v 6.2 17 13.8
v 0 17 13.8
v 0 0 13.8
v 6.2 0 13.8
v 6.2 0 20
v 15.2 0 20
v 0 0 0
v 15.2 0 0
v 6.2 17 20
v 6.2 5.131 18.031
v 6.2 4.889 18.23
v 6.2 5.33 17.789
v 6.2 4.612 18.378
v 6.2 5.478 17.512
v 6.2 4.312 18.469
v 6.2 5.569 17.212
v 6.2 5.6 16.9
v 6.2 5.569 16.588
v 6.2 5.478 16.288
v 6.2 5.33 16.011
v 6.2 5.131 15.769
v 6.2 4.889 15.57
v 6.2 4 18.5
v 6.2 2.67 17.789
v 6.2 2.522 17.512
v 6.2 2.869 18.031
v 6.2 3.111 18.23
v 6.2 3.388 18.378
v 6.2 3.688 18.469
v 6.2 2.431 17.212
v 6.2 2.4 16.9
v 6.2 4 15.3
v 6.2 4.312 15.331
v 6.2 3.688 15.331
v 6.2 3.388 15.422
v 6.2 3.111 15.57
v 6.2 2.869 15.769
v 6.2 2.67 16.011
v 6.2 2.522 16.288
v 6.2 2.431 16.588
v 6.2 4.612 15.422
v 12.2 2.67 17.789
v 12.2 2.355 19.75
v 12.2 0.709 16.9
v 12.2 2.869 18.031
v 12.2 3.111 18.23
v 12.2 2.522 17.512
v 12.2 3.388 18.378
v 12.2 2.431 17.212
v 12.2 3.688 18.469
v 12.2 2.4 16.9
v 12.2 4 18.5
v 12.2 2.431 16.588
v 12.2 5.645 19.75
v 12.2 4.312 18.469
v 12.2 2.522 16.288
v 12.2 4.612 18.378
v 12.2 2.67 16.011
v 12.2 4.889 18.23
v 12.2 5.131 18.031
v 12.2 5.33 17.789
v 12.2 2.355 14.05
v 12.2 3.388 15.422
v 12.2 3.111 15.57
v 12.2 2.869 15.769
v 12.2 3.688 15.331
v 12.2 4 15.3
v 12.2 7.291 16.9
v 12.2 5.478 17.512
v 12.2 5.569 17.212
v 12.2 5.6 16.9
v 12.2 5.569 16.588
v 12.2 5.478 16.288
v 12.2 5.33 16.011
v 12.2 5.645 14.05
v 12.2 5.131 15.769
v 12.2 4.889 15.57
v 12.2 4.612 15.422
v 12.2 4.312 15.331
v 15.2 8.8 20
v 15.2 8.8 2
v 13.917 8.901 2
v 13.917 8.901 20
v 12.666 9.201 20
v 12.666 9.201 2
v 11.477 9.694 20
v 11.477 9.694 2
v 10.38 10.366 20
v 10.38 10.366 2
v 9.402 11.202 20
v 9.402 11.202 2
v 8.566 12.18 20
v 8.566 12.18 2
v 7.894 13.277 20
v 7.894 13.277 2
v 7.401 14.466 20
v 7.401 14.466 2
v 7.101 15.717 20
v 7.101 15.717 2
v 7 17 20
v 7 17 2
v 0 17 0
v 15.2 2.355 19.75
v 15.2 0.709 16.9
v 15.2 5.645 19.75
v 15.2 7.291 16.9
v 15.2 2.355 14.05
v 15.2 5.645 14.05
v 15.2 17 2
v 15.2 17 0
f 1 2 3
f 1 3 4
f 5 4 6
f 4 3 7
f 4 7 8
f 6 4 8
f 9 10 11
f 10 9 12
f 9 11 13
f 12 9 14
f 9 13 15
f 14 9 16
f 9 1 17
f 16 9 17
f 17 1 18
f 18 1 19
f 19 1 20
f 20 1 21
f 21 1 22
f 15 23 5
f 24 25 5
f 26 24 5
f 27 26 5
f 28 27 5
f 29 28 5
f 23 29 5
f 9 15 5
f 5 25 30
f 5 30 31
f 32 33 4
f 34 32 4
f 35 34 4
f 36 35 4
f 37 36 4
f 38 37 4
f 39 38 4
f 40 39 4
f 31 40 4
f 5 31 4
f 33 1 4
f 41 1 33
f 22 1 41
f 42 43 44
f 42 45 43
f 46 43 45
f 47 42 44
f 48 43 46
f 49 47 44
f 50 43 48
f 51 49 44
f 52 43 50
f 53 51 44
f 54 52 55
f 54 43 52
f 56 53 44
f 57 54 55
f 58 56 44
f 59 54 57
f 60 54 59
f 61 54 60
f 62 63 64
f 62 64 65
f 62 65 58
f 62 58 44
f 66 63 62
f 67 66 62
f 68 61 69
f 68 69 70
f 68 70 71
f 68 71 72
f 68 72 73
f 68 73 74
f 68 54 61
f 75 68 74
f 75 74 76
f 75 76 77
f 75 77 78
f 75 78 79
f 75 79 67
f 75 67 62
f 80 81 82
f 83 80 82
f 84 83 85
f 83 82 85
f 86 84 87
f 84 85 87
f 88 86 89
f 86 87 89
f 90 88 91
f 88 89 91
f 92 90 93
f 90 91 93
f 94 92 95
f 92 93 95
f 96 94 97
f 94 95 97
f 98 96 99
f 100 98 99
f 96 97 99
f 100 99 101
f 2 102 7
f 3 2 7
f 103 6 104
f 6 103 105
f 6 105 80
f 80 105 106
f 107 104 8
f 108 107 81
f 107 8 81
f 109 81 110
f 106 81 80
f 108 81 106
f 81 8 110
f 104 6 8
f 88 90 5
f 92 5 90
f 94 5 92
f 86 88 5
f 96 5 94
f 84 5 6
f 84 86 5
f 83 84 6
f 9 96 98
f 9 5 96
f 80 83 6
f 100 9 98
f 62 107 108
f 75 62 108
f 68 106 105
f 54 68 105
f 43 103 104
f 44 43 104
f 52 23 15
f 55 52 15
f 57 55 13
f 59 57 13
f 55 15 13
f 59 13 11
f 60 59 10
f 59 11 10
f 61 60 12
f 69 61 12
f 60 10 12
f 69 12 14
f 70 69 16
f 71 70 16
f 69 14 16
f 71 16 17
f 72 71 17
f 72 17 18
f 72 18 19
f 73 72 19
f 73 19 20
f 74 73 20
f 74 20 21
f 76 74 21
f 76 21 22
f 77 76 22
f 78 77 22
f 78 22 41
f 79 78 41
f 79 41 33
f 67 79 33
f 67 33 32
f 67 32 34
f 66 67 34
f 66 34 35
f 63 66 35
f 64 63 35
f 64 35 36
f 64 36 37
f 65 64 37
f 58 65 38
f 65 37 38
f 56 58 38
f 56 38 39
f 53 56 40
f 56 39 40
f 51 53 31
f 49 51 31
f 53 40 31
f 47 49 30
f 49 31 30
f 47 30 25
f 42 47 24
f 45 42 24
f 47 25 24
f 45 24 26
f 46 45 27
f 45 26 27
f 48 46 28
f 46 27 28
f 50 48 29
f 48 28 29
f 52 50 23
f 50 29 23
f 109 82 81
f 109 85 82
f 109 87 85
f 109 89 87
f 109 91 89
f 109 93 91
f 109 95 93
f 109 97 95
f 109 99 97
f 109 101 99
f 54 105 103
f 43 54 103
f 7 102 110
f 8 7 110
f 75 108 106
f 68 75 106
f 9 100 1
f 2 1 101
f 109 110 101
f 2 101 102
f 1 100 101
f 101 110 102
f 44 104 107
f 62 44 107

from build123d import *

# Parameters (mm, degrees)
CROQUIS1_W              = 15.2
CROQUIS1_H              = 17
SALIENTE_EXTRUIR1_DEPTH = 2
SALIENTE_EXTRUIR2_DEPTH = 11.8
SALIENTE_EXTRUIR3_DEPTH = 6.2
CORTAR_EXTRUIR1_REACH   = 11
CROQUIS4_R              = 1.6
CORTAR_EXTRUIR2_DEPTH   = 3


with BuildPart() as part:
    # Croquis1 → Saliente-Extruir1 (new body)
    with BuildSketch(Plane.XY):
        with Locations((7.6, 8.5)):
            Rectangle(CROQUIS1_W, CROQUIS1_H)
    extrude(amount=SALIENTE_EXTRUIR1_DEPTH)

    # Croquis2 → Saliente-Extruir2 (add)
    with BuildSketch(Plane.XY.offset(2)):
        with BuildLine():
            Line((0, 17), (0, 0))
            Line((0, 0), (15.2, 0))
            Line((15.2, 0), (15.2, 8.8))
            ThreePointArc((15.2, 8.8), (9.401724394, 11.201724394), (7, 17))
            Line((7, 17), (0, 17))
        make_face()
    extrude(amount=SALIENTE_EXTRUIR2_DEPTH)

    # Croquis3 → Saliente-Extruir3 (add)
    with BuildSketch(Plane.XY.offset(13.8)):
        with BuildLine():
            Line((6.2, 17), (6.2, 0))
            Line((6.2, 0), (15.2, 0))
            Line((15.2, 0), (15.2, 8.8))
            ThreePointArc((15.2, 8.8), (9.401724394, 11.201724394), (7, 17))
            Line((7, 17), (6.2, 17))
        make_face()
    extrude(amount=SALIENTE_EXTRUIR3_DEPTH)

    # Croquis4 → Cortar-Extruir1 (cut, up to next)
    with BuildSketch(Plane.ZY.offset(-6.2), mode=Mode.PRIVATE) as cortar_extruir1_sk1:
        with Locations((16.9, 4)):
            Circle(CROQUIS4_R)
    cortar_extruir1_tool1 = extrude(cortar_extruir1_sk1.sketch, amount=-CORTAR_EXTRUIR1_REACH, mode=Mode.PRIVATE) & part.part
    add(cortar_extruir1_tool1.solids().sort_by_distance((6.2, 4, 16.9))[0], mode=Mode.SUBTRACT)

    # Croquis5 → Cortar-Extruir2 (cut)
    with BuildSketch(Plane(origin=(15.2, 0, 0), x_dir=(0, 0, -1), z_dir=(1, 0, 0))):
        Polygon((-16.9, 0.709103466), (-14.05, 2.354551733), (-14.05, 5.645448267), (-16.9, 7.290896534), (-19.75, 5.645448267), (-19.75, 2.354551733), align=None)
    extrude(amount=-CORTAR_EXTRUIR2_DEPTH, mode=Mode.SUBTRACT)


solid = part.part
